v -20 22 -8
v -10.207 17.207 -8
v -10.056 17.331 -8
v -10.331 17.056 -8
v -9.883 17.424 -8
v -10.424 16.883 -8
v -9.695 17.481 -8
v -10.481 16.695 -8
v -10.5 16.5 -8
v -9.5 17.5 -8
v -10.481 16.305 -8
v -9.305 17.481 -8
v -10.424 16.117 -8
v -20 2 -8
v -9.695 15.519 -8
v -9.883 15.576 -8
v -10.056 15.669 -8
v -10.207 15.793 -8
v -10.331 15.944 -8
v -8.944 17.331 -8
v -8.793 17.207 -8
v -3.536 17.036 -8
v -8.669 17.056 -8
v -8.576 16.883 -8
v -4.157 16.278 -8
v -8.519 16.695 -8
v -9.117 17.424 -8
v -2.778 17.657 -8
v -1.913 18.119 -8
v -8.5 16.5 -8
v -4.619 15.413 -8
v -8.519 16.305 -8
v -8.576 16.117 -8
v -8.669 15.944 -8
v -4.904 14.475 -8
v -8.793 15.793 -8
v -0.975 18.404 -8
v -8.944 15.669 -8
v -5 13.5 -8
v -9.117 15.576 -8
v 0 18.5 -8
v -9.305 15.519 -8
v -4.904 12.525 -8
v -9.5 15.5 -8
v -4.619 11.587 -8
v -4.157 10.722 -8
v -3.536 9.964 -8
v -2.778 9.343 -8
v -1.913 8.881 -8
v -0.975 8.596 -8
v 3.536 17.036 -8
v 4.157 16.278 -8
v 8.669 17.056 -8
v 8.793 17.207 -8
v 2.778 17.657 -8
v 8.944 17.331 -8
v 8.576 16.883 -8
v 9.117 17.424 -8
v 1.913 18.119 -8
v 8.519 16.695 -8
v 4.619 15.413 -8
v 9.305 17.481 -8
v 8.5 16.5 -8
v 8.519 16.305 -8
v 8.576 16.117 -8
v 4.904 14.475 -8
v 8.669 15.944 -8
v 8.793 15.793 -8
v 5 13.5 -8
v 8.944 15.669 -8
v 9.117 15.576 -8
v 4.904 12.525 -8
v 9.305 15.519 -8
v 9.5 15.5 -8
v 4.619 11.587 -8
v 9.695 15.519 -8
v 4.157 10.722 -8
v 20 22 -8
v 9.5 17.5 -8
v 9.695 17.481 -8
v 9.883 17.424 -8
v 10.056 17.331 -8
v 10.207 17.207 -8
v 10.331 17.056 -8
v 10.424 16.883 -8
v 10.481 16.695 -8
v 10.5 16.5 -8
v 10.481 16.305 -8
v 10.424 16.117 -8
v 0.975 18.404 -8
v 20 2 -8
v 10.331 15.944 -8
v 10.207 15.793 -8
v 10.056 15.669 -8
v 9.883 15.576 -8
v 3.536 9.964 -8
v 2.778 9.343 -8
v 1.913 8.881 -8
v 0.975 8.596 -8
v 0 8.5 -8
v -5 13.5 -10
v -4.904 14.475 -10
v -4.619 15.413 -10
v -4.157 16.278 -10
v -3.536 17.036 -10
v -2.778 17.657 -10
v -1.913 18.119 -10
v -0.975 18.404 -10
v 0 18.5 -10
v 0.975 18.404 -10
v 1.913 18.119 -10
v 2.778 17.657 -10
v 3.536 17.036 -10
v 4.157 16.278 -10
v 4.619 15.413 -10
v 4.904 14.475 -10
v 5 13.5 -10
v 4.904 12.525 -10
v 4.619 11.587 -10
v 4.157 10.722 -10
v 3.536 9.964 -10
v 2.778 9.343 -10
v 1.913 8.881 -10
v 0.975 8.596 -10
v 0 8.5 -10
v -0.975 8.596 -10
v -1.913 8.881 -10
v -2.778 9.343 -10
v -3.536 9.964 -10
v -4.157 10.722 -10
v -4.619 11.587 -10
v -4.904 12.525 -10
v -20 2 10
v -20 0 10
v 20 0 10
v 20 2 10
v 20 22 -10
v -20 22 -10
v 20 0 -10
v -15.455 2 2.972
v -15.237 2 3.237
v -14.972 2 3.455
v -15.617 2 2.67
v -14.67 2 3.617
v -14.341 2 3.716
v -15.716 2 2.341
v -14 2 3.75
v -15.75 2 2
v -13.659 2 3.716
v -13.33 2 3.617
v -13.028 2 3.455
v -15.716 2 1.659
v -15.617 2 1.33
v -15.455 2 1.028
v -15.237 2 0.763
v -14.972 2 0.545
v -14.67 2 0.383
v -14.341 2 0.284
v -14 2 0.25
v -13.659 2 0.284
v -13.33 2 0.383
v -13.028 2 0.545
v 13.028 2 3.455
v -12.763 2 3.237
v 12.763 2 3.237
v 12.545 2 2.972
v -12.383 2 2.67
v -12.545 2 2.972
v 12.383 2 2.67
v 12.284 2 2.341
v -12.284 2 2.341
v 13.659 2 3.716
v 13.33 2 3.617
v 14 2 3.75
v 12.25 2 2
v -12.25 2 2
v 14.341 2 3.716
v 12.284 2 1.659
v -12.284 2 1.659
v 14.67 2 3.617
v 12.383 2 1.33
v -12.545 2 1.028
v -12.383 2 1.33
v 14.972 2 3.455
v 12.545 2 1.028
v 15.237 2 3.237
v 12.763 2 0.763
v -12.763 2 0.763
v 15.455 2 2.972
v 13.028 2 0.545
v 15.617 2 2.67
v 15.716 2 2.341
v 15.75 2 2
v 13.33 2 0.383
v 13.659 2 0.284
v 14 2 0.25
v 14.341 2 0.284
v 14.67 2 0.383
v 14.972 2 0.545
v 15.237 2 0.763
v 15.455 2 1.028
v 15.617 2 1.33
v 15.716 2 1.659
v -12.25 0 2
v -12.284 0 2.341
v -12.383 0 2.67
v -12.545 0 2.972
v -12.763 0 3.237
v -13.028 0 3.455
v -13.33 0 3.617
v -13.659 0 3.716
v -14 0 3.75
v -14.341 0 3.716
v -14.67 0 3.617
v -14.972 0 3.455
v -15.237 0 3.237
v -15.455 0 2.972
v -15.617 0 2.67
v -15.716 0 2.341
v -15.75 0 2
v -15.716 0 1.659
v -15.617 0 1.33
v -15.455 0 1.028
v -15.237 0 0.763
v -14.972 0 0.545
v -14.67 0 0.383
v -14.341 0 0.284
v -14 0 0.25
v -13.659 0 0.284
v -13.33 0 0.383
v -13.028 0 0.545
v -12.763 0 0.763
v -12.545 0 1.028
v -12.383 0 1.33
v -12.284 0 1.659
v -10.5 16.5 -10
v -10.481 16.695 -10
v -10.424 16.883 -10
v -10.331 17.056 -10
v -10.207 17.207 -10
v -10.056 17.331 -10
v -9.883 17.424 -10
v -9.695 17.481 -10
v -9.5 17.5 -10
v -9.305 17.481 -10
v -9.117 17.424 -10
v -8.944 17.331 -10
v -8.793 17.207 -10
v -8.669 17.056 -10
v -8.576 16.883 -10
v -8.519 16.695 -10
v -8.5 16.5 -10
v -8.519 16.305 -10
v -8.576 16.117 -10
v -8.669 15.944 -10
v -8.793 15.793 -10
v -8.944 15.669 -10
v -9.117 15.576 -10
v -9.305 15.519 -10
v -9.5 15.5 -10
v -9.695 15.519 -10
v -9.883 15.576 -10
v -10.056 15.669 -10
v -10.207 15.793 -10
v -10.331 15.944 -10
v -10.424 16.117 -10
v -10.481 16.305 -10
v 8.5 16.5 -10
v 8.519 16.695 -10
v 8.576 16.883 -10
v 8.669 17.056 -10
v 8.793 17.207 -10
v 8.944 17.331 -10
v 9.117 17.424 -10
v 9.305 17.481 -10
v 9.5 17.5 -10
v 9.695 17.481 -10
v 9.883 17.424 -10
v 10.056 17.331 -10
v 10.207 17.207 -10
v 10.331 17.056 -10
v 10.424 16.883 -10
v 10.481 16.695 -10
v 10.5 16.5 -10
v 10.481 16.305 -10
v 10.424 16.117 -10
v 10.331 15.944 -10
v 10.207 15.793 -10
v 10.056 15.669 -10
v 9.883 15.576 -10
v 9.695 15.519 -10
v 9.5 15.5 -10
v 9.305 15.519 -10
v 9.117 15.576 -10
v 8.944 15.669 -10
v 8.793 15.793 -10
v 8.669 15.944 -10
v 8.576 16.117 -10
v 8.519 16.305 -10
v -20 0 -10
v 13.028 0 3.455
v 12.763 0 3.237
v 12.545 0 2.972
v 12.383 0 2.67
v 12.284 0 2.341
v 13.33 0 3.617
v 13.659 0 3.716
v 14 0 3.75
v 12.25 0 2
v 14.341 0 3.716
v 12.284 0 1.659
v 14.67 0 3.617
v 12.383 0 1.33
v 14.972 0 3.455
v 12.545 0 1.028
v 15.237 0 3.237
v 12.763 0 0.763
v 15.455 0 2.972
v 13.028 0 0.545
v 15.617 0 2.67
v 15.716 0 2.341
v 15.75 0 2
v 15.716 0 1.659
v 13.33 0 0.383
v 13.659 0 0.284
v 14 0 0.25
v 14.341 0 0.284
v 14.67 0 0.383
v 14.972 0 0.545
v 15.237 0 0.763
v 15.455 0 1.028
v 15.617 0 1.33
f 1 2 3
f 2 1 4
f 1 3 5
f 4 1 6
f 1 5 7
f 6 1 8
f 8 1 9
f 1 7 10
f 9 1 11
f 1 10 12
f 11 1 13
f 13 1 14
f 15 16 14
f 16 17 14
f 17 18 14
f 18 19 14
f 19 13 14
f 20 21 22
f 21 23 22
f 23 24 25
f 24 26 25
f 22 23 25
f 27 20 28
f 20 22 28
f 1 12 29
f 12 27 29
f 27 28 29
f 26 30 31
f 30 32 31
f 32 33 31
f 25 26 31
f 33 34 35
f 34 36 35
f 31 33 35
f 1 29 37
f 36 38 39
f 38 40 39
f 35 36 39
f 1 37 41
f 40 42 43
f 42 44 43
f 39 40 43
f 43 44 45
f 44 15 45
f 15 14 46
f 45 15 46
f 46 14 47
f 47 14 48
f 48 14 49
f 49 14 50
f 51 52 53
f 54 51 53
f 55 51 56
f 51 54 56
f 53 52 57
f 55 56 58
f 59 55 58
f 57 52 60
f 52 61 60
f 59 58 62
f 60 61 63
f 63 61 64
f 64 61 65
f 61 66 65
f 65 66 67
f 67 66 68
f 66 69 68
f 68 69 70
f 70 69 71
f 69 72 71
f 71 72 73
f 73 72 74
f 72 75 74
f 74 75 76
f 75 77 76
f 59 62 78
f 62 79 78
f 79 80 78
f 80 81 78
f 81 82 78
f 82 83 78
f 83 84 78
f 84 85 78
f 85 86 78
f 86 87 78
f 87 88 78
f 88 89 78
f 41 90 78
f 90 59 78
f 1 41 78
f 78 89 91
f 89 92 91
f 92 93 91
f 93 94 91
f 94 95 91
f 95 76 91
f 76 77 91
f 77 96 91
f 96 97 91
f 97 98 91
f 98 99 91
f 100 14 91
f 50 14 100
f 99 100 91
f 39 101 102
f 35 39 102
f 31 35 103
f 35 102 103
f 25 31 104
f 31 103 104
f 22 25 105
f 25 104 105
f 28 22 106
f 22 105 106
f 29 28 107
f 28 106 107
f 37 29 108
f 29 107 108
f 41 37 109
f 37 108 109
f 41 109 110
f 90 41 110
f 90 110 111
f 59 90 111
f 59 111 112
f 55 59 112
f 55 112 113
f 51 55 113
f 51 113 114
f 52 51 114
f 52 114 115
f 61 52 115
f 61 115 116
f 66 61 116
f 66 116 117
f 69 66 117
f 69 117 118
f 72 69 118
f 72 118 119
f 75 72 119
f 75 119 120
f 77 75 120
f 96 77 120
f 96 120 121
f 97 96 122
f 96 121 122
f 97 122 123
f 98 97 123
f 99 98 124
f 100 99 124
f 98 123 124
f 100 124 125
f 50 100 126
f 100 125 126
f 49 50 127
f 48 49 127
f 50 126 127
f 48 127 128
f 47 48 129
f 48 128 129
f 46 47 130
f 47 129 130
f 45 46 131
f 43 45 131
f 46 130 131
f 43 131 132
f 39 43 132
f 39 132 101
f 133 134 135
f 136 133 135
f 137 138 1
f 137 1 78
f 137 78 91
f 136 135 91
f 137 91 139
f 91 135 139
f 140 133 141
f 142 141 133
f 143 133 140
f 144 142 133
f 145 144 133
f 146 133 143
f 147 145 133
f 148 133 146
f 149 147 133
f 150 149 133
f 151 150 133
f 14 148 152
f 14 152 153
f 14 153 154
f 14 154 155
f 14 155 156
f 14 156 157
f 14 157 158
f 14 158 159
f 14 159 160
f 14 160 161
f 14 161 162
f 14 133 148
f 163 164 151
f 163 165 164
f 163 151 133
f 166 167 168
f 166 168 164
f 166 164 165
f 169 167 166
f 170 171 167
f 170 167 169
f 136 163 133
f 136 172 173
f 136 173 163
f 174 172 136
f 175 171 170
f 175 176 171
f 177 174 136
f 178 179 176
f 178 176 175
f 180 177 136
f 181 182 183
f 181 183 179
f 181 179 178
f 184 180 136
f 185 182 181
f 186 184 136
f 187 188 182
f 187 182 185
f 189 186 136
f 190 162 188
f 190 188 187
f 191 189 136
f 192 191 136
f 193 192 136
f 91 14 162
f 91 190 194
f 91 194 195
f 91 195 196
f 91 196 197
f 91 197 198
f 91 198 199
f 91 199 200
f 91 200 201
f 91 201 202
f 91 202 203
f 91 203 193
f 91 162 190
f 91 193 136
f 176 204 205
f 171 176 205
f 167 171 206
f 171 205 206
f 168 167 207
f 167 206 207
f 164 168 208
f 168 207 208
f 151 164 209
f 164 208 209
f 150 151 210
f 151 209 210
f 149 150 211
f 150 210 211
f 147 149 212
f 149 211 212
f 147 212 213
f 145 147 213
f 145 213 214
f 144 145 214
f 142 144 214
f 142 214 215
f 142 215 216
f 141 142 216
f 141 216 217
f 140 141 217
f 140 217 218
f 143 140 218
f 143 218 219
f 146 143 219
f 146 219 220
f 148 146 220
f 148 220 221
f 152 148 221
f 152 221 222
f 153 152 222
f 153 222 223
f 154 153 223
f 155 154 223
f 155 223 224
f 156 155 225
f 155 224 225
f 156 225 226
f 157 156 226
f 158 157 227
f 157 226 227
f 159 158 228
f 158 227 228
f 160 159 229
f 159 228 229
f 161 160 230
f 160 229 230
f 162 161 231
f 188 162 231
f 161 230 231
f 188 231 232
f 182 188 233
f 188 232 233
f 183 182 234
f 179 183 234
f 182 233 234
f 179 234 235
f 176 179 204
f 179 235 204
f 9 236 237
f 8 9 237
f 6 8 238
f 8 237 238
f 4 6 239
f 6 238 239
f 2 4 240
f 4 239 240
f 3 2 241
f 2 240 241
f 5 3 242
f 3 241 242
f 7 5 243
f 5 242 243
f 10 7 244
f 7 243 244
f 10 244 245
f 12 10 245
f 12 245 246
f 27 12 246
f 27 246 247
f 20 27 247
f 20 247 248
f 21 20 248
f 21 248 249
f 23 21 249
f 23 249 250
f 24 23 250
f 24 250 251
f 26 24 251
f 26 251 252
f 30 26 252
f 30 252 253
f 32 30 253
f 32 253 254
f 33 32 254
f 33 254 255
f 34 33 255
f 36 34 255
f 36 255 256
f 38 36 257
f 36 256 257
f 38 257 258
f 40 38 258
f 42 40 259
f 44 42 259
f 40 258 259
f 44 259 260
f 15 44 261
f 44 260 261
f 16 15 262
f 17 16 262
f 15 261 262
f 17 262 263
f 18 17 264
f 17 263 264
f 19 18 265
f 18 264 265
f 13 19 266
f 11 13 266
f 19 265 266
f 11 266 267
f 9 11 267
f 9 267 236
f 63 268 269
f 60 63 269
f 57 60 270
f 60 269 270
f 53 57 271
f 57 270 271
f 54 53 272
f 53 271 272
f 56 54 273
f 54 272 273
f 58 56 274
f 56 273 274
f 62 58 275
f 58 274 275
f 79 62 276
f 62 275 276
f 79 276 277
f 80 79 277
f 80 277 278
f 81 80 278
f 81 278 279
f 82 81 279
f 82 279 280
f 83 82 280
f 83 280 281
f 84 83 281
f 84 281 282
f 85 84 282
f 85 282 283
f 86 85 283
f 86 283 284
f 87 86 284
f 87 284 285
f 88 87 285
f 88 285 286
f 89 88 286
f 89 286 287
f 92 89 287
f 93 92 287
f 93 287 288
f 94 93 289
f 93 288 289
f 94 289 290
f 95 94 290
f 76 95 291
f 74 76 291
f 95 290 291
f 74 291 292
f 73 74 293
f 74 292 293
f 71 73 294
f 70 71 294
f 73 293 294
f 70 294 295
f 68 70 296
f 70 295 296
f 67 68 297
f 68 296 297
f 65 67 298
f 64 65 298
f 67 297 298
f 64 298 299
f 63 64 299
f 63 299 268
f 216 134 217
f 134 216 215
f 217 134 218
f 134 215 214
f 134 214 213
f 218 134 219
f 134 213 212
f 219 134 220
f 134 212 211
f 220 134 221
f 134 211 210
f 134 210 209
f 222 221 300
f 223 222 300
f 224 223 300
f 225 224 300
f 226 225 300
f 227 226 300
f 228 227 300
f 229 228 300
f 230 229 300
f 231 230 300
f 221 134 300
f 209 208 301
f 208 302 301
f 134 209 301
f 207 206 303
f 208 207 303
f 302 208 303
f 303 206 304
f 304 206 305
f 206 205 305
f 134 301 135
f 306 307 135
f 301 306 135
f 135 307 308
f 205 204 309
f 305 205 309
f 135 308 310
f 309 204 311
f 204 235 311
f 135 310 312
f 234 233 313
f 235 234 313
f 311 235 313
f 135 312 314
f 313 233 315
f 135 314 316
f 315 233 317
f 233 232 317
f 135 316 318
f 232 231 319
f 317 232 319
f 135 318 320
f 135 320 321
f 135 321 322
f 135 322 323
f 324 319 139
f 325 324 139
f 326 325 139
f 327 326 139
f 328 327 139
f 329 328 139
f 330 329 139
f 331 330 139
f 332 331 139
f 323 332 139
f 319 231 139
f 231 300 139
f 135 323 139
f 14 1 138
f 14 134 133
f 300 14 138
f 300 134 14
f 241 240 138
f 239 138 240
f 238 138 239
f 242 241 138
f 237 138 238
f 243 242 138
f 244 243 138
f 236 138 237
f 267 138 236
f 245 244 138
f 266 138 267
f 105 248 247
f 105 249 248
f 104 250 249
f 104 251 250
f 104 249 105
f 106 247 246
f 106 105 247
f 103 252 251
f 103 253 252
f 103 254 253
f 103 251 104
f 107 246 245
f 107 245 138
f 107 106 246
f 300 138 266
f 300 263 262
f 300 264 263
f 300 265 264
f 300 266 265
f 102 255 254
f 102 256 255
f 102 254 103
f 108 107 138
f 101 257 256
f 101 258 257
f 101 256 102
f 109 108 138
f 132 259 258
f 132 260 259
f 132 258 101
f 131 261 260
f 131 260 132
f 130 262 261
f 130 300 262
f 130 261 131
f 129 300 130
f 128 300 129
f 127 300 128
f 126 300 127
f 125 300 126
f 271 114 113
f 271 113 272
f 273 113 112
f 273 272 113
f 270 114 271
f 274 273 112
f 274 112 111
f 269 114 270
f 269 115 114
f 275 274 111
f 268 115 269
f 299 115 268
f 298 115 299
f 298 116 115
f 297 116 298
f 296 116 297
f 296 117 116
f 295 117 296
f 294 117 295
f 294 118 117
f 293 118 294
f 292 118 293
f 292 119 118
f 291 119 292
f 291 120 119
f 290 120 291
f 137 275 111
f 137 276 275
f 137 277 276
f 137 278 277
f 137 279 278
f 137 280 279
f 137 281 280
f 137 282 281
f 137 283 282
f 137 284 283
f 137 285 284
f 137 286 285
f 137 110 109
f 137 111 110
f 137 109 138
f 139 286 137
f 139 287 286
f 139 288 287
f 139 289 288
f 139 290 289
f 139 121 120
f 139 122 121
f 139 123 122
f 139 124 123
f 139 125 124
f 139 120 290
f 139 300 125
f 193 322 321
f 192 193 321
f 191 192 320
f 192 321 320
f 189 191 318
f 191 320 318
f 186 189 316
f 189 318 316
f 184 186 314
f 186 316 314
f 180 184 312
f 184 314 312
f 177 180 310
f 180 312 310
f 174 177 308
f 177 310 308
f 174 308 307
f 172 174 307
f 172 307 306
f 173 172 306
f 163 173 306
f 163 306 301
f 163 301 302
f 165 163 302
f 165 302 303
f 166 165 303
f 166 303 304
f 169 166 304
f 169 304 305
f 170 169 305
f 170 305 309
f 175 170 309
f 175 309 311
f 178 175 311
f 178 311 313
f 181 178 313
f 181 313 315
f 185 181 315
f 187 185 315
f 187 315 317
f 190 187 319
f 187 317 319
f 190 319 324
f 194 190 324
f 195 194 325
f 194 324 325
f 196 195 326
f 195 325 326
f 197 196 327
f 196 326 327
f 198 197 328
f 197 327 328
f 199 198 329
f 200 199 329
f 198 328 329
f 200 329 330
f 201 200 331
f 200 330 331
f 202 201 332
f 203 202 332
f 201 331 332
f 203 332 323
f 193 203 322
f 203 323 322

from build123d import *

# Parameters (mm, degrees)
SKETCH1_W           = 40
SKETCH1_H           = 20
BOSS_EXTRUDE1_DEPTH = 2
SKETCH2_W           = 40
SKETCH2_H           = 2
BOSS_EXTRUDE2_DEPTH = 20
SKETCH3_R           = 1.75
CUT_EXTRUDE1_DEPTH  = 23
SKETCH4_R           = 5
SKETCH4_R_2         = 1
CUT_EXTRUDE2_DEPTH  = 21


with BuildPart() as part:
    # Sketch1 → Boss-Extrude1 (new body)
    with BuildSketch(Plane(origin=(0, 0, 0), x_dir=(1, 0, 0), z_dir=(0, 1, 0))):
        Rectangle(SKETCH1_W, SKETCH1_H)
    extrude(amount=BOSS_EXTRUDE1_DEPTH)

    # Sketch2 → Boss-Extrude2 (add)
    with BuildSketch(Plane(origin=(0, 2, 0), x_dir=(1, 0, 0), z_dir=(0, 1, 0))):
        with Locations((0, 9)):
            Rectangle(SKETCH2_W, SKETCH2_H)
    extrude(amount=BOSS_EXTRUDE2_DEPTH)

    # Sketch3 → Cut-Extrude1 (cut, through all)
    with BuildSketch(Plane.XZ):
        with Locations((-14, 2)):
            Circle(SKETCH3_R)
        with Locations((14, 2)):
            Circle(SKETCH3_R)
    extrude(amount=-CUT_EXTRUDE1_DEPTH, mode=Mode.SUBTRACT)

    # Sketch4 → Cut-Extrude2 (cut, through all)
    with BuildSketch(Plane(origin=(0, 0, -10), x_dir=(-1, 0, 0), z_dir=(0, 0, -1))):
        with Locations((0, 13.5)):
            Circle(SKETCH4_R)
        with Locations((-9.5, 16.5)):
            Circle(SKETCH4_R_2)
        with Locations((9.5, 16.5)):
            Circle(SKETCH4_R_2)
    extrude(amount=-CUT_EXTRUDE2_DEPTH, mode=Mode.SUBTRACT)


solid = part.part
